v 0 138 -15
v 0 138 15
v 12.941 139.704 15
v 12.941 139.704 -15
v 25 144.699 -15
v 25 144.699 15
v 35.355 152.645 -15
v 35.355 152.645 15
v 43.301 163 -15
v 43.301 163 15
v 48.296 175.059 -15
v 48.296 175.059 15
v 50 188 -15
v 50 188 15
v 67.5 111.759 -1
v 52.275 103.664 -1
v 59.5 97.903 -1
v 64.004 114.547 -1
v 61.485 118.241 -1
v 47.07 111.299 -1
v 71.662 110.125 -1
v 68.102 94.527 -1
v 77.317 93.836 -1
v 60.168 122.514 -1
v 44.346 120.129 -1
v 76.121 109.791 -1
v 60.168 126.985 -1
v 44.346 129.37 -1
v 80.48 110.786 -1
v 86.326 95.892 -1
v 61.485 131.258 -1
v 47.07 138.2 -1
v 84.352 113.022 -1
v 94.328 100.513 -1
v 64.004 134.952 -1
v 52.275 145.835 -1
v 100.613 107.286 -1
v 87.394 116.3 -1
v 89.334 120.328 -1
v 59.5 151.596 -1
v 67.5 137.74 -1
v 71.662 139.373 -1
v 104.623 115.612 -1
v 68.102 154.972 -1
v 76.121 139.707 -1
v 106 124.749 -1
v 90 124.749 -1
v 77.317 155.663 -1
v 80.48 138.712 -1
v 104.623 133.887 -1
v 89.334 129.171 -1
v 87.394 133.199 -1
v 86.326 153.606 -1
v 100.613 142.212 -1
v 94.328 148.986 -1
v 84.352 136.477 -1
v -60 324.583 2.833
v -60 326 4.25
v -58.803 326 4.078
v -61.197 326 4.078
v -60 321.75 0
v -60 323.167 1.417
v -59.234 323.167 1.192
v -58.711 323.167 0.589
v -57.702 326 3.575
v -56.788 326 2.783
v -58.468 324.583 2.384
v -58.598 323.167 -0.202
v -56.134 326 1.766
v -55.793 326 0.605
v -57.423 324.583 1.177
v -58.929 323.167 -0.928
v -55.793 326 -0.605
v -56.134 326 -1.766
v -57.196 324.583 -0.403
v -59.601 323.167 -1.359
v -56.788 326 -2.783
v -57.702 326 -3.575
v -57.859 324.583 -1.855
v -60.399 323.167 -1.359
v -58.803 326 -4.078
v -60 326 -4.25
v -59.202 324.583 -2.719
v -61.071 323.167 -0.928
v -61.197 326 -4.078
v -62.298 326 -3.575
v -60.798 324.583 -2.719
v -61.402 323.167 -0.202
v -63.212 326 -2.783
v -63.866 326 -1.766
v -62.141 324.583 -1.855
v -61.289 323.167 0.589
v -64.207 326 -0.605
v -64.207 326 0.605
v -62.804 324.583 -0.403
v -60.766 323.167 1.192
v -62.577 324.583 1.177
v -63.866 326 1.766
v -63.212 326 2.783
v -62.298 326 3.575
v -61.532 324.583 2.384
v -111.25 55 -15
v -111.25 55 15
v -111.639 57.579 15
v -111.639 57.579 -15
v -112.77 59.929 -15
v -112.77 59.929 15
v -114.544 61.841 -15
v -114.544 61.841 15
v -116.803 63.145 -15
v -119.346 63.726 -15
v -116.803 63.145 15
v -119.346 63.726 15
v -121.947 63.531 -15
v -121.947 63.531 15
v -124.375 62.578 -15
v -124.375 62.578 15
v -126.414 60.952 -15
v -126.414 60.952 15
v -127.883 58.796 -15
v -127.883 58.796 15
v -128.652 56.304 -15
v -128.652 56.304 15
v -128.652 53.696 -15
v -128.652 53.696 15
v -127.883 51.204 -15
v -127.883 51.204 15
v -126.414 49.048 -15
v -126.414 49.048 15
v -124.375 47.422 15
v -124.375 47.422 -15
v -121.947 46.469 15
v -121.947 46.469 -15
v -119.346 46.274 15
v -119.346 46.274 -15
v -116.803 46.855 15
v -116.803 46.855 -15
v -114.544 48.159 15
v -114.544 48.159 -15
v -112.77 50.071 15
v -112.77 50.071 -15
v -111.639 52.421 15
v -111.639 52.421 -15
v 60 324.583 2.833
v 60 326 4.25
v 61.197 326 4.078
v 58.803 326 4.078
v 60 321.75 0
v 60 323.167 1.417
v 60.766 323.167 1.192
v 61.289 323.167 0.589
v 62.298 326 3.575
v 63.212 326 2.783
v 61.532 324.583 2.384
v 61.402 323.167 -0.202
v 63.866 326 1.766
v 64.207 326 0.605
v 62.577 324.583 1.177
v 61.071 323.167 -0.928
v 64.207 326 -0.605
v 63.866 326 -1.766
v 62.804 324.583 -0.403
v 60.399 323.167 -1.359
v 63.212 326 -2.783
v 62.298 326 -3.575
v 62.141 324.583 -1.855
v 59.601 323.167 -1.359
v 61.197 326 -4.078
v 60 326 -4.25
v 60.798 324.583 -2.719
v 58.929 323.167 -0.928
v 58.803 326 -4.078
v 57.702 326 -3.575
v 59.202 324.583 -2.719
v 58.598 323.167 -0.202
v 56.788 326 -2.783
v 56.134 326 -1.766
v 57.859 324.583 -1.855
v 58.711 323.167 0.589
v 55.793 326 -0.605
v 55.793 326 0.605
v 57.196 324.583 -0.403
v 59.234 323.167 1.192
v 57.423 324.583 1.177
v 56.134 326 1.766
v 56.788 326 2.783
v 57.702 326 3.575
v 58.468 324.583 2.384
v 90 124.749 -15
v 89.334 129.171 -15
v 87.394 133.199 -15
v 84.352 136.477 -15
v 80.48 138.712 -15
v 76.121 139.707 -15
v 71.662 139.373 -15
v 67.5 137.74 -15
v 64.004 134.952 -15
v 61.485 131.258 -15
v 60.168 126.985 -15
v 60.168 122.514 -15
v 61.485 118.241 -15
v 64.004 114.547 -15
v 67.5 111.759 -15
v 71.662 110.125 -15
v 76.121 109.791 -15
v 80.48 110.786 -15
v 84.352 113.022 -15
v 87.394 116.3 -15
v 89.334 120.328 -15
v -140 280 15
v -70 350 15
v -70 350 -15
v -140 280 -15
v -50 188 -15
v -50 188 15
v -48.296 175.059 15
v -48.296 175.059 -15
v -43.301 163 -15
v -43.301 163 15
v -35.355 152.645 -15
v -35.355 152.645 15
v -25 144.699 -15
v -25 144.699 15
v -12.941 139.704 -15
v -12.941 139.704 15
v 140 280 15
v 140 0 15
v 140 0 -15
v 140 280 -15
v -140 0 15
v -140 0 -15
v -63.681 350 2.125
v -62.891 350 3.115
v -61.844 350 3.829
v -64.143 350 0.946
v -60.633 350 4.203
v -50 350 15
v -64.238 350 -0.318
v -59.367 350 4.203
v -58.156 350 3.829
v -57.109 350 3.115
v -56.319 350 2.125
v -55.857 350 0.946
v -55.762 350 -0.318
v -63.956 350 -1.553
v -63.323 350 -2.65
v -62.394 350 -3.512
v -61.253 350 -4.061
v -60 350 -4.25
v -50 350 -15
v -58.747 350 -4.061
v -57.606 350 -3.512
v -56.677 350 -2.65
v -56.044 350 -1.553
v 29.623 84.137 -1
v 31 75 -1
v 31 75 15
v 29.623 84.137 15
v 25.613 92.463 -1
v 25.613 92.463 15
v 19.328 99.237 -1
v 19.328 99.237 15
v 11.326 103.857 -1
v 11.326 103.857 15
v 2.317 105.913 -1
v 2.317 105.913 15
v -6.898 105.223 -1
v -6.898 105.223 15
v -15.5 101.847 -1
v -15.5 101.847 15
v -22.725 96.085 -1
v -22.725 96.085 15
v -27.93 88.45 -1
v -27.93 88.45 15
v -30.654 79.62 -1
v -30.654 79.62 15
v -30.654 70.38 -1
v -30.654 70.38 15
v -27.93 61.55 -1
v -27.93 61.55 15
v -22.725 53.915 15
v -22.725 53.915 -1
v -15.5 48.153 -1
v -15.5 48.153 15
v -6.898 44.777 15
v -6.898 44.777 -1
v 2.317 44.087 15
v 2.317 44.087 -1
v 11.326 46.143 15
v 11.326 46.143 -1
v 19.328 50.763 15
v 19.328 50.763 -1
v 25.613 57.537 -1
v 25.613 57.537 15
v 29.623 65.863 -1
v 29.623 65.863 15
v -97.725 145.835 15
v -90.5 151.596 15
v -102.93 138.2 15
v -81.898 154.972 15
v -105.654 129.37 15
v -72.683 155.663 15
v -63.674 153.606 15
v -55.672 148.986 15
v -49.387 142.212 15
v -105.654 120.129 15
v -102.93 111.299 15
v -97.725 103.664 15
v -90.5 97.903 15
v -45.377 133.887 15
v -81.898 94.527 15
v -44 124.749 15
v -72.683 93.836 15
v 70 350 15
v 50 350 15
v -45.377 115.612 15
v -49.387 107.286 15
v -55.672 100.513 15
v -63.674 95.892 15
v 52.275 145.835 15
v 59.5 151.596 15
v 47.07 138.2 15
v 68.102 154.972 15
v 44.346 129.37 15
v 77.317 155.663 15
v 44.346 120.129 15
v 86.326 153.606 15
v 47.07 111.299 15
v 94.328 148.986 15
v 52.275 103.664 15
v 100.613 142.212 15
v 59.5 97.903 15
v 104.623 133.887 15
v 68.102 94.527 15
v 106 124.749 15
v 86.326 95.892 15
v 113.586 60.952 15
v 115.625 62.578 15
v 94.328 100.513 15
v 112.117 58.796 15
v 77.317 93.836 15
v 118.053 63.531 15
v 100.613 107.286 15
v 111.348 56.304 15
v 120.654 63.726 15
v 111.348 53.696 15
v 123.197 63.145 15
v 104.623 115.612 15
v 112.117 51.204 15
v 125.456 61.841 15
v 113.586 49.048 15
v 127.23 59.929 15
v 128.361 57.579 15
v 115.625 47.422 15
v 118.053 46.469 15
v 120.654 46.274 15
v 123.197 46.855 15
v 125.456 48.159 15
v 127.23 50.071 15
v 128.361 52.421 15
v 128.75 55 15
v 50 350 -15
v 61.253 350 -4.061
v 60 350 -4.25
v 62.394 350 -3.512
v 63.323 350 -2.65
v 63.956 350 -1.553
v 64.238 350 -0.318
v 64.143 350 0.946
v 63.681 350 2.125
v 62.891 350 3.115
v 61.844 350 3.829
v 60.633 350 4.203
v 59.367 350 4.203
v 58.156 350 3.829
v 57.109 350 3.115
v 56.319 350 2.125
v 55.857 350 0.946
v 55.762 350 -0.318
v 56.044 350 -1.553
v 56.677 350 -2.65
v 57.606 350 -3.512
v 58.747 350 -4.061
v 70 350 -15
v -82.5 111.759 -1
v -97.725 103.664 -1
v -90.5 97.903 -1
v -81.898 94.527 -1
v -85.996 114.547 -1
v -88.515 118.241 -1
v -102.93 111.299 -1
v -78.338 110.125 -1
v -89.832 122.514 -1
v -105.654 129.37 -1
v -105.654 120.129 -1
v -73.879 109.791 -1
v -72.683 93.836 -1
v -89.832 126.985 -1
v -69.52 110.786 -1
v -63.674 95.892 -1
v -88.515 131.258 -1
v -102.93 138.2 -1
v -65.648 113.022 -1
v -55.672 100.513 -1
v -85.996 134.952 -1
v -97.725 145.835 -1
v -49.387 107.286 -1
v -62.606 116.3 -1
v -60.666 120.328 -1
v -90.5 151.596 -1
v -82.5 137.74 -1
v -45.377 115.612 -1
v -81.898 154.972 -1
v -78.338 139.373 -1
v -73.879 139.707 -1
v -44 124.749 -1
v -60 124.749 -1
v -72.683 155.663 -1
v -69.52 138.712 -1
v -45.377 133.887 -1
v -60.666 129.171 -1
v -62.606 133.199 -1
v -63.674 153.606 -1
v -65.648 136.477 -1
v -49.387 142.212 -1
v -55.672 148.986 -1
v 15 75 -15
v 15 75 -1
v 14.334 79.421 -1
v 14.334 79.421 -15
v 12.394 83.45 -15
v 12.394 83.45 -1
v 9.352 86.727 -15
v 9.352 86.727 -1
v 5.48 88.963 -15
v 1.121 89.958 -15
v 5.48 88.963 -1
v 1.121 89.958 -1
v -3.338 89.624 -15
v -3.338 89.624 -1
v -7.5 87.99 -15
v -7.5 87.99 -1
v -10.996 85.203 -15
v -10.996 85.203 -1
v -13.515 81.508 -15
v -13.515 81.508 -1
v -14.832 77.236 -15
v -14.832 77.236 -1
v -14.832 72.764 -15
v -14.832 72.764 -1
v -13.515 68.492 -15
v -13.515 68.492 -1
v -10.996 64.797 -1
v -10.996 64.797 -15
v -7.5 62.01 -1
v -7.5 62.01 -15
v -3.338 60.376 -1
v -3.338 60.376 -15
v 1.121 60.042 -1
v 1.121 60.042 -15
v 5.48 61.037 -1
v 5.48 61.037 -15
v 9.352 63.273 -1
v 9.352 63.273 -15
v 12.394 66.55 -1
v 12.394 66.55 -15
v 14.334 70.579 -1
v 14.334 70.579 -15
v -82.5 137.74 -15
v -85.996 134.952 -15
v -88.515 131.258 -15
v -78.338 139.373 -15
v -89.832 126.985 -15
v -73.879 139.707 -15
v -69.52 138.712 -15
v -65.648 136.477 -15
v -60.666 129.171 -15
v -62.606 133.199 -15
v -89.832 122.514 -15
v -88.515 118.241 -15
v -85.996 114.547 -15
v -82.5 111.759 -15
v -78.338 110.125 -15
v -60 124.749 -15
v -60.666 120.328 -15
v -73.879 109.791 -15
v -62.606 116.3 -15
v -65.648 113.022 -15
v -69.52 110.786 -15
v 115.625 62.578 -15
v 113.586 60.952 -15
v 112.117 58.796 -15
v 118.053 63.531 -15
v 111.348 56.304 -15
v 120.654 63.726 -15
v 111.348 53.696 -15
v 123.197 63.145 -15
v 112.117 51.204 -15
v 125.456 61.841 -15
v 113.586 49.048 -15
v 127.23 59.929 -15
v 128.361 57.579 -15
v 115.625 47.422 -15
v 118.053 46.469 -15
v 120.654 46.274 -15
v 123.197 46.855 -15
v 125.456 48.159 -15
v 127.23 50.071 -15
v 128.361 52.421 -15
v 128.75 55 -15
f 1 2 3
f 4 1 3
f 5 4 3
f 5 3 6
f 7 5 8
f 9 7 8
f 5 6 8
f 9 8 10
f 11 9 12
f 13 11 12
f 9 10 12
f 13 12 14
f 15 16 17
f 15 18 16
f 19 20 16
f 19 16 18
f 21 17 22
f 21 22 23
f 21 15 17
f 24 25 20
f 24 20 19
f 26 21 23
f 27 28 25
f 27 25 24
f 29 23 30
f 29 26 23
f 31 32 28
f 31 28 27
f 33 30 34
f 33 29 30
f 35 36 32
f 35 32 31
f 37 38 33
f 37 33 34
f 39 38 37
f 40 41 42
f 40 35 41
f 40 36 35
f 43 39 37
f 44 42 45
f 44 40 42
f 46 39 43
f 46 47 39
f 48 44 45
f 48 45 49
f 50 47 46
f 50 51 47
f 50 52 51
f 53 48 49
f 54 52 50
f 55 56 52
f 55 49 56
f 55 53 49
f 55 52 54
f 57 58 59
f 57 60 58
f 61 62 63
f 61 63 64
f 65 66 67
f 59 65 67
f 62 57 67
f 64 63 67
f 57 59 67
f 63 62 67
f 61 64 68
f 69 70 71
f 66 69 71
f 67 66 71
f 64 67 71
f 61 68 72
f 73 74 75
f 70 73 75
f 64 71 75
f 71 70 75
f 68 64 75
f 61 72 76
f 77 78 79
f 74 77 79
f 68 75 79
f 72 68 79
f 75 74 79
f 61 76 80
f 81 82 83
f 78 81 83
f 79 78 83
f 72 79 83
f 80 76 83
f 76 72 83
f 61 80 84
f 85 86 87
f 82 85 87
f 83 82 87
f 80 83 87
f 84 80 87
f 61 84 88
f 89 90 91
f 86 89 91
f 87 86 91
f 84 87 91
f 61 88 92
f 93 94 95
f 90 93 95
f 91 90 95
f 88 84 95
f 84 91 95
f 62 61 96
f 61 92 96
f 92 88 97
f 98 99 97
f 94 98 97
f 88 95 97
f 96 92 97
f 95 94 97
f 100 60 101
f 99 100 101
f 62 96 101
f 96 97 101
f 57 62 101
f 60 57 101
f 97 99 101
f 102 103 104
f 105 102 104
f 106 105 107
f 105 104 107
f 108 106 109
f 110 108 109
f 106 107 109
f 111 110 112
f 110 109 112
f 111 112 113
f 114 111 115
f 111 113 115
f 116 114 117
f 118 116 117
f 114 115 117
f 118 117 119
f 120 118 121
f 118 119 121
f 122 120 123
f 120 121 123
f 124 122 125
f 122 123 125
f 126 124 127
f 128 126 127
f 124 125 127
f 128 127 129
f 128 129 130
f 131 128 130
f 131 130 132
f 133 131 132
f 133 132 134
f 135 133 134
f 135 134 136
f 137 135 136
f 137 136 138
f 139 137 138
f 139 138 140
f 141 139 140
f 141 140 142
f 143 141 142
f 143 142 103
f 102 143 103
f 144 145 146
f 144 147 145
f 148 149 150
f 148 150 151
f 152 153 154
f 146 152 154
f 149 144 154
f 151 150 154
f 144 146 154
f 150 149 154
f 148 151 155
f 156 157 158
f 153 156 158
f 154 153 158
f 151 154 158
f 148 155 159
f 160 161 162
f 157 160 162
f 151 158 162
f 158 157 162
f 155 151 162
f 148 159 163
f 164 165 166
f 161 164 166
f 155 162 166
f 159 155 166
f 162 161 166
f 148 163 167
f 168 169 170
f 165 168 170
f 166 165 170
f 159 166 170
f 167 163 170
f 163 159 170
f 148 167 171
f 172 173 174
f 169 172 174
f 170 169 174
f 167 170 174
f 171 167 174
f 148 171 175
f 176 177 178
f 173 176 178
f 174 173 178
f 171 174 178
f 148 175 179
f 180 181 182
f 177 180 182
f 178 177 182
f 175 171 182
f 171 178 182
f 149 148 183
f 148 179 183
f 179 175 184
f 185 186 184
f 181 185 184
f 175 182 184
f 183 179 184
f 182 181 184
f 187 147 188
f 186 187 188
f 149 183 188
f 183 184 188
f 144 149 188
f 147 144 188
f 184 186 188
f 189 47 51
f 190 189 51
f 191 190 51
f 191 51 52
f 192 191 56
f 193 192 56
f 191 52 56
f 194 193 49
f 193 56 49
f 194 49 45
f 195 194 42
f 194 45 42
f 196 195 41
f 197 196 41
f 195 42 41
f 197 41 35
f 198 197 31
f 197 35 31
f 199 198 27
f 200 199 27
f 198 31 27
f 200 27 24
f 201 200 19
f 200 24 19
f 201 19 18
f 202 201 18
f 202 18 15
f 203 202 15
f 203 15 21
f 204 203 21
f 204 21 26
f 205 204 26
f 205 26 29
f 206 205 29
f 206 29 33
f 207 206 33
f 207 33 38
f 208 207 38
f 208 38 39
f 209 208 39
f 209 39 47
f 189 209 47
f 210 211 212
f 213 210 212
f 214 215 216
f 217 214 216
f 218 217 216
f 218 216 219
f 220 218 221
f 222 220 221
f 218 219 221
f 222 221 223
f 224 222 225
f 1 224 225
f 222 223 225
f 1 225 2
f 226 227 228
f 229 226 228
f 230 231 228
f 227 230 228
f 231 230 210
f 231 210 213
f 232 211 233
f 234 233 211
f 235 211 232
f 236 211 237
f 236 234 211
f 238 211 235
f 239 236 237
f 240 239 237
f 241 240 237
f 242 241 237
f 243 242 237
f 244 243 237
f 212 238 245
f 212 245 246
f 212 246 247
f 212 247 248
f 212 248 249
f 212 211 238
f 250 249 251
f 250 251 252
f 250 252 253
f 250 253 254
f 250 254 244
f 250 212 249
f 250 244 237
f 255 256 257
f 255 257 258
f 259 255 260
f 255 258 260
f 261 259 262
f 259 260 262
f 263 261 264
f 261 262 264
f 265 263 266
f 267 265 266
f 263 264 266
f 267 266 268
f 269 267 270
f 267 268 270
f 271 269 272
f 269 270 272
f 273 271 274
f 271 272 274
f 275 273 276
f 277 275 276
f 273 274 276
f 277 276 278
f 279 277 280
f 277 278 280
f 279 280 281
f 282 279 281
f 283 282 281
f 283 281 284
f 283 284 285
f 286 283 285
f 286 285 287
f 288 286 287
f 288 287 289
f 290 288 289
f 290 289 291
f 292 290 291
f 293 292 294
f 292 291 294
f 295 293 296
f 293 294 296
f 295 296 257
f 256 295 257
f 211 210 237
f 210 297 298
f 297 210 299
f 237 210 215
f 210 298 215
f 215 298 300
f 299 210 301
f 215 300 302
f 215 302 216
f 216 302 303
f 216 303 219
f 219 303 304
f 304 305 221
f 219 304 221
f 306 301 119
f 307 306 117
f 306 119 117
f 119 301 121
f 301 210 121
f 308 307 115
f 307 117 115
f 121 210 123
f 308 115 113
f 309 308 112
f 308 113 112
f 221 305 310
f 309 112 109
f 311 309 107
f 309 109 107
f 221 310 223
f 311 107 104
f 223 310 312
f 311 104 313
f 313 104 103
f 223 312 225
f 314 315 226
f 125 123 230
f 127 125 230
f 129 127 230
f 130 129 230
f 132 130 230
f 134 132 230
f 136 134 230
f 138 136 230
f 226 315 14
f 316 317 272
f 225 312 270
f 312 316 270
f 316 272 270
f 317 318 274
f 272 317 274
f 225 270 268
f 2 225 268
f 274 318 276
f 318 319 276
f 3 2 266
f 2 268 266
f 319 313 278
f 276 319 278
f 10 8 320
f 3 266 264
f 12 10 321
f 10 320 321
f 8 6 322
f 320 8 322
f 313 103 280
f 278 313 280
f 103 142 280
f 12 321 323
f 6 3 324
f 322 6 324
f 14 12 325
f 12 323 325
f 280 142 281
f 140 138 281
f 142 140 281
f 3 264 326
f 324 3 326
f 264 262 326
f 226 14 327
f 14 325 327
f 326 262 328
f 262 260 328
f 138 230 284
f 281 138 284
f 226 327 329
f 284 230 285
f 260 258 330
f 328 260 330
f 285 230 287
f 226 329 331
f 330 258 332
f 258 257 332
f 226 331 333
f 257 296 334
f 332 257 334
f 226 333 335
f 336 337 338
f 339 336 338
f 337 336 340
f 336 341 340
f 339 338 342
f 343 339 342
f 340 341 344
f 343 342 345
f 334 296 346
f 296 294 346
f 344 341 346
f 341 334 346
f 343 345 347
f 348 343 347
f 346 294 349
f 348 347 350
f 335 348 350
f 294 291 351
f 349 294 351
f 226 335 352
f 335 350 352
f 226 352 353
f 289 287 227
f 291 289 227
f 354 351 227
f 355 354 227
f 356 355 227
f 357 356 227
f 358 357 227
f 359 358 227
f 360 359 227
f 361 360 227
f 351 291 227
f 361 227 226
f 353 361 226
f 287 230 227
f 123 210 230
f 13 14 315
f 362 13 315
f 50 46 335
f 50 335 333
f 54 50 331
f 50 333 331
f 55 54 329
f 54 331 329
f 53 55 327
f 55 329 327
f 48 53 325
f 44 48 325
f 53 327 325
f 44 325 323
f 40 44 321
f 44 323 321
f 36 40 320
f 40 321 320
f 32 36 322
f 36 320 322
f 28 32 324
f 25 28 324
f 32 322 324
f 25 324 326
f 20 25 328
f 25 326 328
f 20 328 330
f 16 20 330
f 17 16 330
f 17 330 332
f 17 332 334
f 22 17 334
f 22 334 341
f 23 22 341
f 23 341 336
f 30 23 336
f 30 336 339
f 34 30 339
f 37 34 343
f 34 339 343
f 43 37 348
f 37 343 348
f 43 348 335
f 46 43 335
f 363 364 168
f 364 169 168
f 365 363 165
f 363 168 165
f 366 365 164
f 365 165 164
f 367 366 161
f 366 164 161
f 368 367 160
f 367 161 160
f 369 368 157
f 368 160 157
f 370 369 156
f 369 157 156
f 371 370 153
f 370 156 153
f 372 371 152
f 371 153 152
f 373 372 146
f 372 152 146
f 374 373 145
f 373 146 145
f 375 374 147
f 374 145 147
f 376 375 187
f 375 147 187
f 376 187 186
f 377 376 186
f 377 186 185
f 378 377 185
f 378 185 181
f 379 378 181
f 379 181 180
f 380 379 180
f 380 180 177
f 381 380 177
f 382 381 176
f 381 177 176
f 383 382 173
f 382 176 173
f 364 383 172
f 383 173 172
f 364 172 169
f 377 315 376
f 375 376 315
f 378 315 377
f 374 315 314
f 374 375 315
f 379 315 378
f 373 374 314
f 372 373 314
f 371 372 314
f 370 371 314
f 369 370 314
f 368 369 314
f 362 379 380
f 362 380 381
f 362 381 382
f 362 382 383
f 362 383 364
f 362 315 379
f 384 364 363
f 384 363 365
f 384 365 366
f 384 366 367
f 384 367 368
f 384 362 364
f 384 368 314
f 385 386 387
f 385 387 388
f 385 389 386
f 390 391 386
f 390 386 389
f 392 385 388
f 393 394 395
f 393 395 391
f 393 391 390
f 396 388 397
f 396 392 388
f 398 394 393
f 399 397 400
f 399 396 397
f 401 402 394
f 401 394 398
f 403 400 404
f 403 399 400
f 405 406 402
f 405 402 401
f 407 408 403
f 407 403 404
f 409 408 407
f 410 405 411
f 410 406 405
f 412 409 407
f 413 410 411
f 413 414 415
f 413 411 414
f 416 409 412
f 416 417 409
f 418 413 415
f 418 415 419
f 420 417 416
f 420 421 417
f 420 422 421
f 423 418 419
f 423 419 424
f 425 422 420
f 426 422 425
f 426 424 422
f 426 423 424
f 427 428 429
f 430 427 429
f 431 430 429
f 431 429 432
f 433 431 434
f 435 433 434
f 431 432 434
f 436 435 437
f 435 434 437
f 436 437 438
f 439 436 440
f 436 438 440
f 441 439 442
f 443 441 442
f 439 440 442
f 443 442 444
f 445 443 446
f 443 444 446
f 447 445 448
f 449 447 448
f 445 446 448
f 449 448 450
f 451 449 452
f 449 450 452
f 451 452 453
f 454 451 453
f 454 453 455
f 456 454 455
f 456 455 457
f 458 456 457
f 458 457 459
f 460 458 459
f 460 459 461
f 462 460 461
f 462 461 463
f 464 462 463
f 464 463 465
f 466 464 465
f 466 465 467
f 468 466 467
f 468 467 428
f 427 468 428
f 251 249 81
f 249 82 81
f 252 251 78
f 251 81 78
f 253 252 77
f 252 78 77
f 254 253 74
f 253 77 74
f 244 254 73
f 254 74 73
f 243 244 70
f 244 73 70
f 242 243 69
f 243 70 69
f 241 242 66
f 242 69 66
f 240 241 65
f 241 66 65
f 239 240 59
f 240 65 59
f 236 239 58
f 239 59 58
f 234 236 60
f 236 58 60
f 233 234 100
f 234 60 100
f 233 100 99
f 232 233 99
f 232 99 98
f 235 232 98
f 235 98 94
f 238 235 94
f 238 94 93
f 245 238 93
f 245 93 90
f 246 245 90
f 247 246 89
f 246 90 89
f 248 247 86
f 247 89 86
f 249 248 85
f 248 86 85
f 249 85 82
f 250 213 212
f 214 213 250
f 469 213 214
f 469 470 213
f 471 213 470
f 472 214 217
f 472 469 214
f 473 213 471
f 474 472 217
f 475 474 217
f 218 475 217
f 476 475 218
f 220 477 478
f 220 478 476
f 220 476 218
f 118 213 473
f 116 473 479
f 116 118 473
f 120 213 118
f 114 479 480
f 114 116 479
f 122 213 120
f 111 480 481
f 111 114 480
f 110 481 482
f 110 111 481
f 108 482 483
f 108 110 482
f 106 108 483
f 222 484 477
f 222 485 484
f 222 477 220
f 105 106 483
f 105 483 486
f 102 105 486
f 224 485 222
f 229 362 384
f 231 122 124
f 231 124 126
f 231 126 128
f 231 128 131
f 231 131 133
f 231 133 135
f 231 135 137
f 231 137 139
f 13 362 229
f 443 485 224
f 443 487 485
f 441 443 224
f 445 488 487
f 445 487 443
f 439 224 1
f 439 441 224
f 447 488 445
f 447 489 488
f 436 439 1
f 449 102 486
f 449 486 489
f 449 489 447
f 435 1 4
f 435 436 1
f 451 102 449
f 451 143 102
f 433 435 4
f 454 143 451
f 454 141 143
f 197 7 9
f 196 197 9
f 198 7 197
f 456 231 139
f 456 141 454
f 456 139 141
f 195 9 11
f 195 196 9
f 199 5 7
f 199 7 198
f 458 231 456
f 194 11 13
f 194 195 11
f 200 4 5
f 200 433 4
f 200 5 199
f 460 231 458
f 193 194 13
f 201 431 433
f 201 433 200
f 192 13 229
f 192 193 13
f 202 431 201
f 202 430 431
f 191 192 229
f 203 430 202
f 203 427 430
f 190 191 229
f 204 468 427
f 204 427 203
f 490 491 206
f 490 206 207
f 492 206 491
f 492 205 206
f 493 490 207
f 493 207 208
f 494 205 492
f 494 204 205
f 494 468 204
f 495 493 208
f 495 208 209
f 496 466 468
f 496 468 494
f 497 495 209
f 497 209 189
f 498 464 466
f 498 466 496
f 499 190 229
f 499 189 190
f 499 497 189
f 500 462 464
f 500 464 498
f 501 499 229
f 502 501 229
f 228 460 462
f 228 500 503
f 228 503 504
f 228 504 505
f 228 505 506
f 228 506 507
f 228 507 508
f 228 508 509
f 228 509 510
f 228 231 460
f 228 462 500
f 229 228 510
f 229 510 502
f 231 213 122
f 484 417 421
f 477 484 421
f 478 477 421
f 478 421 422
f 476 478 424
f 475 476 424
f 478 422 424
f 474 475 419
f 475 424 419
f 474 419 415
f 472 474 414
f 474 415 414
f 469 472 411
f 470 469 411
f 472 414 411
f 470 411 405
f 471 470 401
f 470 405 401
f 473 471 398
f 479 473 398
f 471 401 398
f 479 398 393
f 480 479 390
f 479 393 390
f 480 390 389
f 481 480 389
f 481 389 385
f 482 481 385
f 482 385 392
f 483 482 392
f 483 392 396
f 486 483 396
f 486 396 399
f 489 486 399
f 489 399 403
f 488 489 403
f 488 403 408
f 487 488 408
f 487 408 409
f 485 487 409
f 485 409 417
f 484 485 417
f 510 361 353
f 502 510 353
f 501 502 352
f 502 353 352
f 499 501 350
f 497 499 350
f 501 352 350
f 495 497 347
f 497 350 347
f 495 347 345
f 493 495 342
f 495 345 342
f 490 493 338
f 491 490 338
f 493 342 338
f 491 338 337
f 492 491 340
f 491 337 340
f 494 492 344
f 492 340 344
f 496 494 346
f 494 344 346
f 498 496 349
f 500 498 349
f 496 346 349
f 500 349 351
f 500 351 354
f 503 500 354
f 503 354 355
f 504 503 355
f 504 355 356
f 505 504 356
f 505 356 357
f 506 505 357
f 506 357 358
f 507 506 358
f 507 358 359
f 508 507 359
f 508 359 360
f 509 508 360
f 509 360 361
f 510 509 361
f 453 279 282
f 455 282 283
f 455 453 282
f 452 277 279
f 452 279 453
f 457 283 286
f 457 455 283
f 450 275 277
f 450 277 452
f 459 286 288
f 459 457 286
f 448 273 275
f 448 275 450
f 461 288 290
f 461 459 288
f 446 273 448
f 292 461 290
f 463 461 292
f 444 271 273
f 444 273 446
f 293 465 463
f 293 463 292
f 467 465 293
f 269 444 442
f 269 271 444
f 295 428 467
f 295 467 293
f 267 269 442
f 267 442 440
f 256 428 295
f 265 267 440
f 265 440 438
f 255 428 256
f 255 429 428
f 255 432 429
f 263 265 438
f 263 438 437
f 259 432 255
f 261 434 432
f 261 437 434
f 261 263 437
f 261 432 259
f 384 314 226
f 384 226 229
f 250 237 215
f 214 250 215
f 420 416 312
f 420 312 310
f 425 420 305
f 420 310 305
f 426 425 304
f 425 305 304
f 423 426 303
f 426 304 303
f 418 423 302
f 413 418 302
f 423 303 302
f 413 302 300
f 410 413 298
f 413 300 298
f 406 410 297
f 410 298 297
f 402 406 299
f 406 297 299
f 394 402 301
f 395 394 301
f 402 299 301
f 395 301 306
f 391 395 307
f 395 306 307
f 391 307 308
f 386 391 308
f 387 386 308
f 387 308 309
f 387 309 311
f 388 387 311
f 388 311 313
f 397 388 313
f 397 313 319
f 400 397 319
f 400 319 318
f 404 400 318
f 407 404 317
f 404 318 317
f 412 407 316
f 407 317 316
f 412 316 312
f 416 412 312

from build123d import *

# Parameters (mm, degrees)
SKETCH2_W              = 280
SKETCH2_H              = 30
BOSS_EXTRUDE2_DEPTH    = 350
CUT_EXTRUDE1_DEPTH     = 350
CHAMFER1_SIZE          = 70
M10_TAPPED_HOLE1_D     = 8.5
M10_TAPPED_HOLE1_DEPTH = 24
M10_TAPPED_HOLE1_TIP   = 4.25
SKETCH8_R              = 8.75
CUT_EXTRUDE2_DEPTH     = 350
SKETCH9_R              = 15
CUT_EXTRUDE3_DEPTH     = 350
SKETCH10_R             = 31
CUT_EXTRUDE4_DEPTH     = 16


with BuildPart() as part:
    # Sketch2 → Boss-Extrude2 (new body)
    with BuildSketch(Plane(origin=(0, 0, 0), x_dir=(1, 0, 0), z_dir=(0, 1, 0))):
        Rectangle(SKETCH2_W, SKETCH2_H)
    extrude(amount=BOSS_EXTRUDE2_DEPTH)

    # Sketch4 → Cut-Extrude1 (cut)
    with BuildSketch(Plane.XY.offset(15)):
        with BuildLine():
            Line((50, 350), (0, 350))
            Line((0, 350), (0, 138))
            ThreePointArc((0, 138), (35.355339059, 152.644660941), (50, 188))
            Line((50, 188), (50, 350))
        make_face()
        with BuildLine():
            Line((0, 138), (0, 350))
            Line((0, 350), (-50, 350))
            Line((-50, 350), (-50, 188))
            ThreePointArc((-50, 188), (-35.355339059, 152.644660941), (0, 138))
        make_face()
        with BuildLine():
            ThreePointArc((50, 350), (35.355339059, 385.355339059), (0, 400))
            Line((0, 400), (0, 350))
            Line((0, 350), (50, 350))
        make_face()
        with BuildLine():
            Line((0, 350), (0, 400))
            ThreePointArc((0, 400), (-35.355339059, 385.355339059), (-50, 350))
            Line((-50, 350), (0, 350))
        make_face()
    extrude(amount=-CUT_EXTRUDE1_DEPTH, mode=Mode.SUBTRACT)

    # Chamfer1
    chamfer1_edges = [part.edges().sort_by_distance(p)[0] for p in [
        (140, 350, 0),
        (-140, 350, 0),
    ]]
    chamfer(chamfer1_edges, length=CHAMFER1_SIZE)

    # M10 Tapped Hole1
    with Locations(Plane(origin=(-60, 350, 0), x_dir=(0, 0, 1), z_dir=(0, 1, 0))):
        with Locations((0, 0), (0, 120)):
            Hole(M10_TAPPED_HOLE1_D / 2, depth=M10_TAPPED_HOLE1_DEPTH)
            with Locations((0, 0, -(M10_TAPPED_HOLE1_DEPTH + M10_TAPPED_HOLE1_TIP / 2))):  # 90° drill point
                Cone(0, M10_TAPPED_HOLE1_D / 2, M10_TAPPED_HOLE1_TIP, mode=Mode.SUBTRACT)

    # Sketch8 → Cut-Extrude2 (cut)
    with BuildSketch(Plane.XY.offset(15)):
        with Locations((-120, 55)):
            Circle(SKETCH8_R)
        with Locations((120, 55)):
            Circle(SKETCH8_R)
    extrude(amount=-CUT_EXTRUDE2_DEPTH, mode=Mode.SUBTRACT)

    # Sketch9 → Cut-Extrude3 (cut)
    with BuildSketch(Plane.XY.offset(15)):
        with Locations((-75, 124.749371855)):
            Circle(SKETCH9_R)
        with Locations((75, 124.749371855)):
            Circle(SKETCH9_R)
        with Locations((0, 75)):
            Circle(SKETCH9_R)
    extrude(amount=-CUT_EXTRUDE3_DEPTH, mode=Mode.SUBTRACT)

    # Sketch10 → Cut-Extrude4 (cut)
    with BuildSketch(Plane.XY.offset(15)):
        with Locations((-75, 124.749371855)):
            Circle(SKETCH10_R)
        with Locations((0, 75)):
            Circle(SKETCH10_R)
        with Locations((75, 124.749371855)):
            Circle(SKETCH10_R)
    extrude(amount=-CUT_EXTRUDE4_DEPTH, mode=Mode.SUBTRACT)


solid = part.part
